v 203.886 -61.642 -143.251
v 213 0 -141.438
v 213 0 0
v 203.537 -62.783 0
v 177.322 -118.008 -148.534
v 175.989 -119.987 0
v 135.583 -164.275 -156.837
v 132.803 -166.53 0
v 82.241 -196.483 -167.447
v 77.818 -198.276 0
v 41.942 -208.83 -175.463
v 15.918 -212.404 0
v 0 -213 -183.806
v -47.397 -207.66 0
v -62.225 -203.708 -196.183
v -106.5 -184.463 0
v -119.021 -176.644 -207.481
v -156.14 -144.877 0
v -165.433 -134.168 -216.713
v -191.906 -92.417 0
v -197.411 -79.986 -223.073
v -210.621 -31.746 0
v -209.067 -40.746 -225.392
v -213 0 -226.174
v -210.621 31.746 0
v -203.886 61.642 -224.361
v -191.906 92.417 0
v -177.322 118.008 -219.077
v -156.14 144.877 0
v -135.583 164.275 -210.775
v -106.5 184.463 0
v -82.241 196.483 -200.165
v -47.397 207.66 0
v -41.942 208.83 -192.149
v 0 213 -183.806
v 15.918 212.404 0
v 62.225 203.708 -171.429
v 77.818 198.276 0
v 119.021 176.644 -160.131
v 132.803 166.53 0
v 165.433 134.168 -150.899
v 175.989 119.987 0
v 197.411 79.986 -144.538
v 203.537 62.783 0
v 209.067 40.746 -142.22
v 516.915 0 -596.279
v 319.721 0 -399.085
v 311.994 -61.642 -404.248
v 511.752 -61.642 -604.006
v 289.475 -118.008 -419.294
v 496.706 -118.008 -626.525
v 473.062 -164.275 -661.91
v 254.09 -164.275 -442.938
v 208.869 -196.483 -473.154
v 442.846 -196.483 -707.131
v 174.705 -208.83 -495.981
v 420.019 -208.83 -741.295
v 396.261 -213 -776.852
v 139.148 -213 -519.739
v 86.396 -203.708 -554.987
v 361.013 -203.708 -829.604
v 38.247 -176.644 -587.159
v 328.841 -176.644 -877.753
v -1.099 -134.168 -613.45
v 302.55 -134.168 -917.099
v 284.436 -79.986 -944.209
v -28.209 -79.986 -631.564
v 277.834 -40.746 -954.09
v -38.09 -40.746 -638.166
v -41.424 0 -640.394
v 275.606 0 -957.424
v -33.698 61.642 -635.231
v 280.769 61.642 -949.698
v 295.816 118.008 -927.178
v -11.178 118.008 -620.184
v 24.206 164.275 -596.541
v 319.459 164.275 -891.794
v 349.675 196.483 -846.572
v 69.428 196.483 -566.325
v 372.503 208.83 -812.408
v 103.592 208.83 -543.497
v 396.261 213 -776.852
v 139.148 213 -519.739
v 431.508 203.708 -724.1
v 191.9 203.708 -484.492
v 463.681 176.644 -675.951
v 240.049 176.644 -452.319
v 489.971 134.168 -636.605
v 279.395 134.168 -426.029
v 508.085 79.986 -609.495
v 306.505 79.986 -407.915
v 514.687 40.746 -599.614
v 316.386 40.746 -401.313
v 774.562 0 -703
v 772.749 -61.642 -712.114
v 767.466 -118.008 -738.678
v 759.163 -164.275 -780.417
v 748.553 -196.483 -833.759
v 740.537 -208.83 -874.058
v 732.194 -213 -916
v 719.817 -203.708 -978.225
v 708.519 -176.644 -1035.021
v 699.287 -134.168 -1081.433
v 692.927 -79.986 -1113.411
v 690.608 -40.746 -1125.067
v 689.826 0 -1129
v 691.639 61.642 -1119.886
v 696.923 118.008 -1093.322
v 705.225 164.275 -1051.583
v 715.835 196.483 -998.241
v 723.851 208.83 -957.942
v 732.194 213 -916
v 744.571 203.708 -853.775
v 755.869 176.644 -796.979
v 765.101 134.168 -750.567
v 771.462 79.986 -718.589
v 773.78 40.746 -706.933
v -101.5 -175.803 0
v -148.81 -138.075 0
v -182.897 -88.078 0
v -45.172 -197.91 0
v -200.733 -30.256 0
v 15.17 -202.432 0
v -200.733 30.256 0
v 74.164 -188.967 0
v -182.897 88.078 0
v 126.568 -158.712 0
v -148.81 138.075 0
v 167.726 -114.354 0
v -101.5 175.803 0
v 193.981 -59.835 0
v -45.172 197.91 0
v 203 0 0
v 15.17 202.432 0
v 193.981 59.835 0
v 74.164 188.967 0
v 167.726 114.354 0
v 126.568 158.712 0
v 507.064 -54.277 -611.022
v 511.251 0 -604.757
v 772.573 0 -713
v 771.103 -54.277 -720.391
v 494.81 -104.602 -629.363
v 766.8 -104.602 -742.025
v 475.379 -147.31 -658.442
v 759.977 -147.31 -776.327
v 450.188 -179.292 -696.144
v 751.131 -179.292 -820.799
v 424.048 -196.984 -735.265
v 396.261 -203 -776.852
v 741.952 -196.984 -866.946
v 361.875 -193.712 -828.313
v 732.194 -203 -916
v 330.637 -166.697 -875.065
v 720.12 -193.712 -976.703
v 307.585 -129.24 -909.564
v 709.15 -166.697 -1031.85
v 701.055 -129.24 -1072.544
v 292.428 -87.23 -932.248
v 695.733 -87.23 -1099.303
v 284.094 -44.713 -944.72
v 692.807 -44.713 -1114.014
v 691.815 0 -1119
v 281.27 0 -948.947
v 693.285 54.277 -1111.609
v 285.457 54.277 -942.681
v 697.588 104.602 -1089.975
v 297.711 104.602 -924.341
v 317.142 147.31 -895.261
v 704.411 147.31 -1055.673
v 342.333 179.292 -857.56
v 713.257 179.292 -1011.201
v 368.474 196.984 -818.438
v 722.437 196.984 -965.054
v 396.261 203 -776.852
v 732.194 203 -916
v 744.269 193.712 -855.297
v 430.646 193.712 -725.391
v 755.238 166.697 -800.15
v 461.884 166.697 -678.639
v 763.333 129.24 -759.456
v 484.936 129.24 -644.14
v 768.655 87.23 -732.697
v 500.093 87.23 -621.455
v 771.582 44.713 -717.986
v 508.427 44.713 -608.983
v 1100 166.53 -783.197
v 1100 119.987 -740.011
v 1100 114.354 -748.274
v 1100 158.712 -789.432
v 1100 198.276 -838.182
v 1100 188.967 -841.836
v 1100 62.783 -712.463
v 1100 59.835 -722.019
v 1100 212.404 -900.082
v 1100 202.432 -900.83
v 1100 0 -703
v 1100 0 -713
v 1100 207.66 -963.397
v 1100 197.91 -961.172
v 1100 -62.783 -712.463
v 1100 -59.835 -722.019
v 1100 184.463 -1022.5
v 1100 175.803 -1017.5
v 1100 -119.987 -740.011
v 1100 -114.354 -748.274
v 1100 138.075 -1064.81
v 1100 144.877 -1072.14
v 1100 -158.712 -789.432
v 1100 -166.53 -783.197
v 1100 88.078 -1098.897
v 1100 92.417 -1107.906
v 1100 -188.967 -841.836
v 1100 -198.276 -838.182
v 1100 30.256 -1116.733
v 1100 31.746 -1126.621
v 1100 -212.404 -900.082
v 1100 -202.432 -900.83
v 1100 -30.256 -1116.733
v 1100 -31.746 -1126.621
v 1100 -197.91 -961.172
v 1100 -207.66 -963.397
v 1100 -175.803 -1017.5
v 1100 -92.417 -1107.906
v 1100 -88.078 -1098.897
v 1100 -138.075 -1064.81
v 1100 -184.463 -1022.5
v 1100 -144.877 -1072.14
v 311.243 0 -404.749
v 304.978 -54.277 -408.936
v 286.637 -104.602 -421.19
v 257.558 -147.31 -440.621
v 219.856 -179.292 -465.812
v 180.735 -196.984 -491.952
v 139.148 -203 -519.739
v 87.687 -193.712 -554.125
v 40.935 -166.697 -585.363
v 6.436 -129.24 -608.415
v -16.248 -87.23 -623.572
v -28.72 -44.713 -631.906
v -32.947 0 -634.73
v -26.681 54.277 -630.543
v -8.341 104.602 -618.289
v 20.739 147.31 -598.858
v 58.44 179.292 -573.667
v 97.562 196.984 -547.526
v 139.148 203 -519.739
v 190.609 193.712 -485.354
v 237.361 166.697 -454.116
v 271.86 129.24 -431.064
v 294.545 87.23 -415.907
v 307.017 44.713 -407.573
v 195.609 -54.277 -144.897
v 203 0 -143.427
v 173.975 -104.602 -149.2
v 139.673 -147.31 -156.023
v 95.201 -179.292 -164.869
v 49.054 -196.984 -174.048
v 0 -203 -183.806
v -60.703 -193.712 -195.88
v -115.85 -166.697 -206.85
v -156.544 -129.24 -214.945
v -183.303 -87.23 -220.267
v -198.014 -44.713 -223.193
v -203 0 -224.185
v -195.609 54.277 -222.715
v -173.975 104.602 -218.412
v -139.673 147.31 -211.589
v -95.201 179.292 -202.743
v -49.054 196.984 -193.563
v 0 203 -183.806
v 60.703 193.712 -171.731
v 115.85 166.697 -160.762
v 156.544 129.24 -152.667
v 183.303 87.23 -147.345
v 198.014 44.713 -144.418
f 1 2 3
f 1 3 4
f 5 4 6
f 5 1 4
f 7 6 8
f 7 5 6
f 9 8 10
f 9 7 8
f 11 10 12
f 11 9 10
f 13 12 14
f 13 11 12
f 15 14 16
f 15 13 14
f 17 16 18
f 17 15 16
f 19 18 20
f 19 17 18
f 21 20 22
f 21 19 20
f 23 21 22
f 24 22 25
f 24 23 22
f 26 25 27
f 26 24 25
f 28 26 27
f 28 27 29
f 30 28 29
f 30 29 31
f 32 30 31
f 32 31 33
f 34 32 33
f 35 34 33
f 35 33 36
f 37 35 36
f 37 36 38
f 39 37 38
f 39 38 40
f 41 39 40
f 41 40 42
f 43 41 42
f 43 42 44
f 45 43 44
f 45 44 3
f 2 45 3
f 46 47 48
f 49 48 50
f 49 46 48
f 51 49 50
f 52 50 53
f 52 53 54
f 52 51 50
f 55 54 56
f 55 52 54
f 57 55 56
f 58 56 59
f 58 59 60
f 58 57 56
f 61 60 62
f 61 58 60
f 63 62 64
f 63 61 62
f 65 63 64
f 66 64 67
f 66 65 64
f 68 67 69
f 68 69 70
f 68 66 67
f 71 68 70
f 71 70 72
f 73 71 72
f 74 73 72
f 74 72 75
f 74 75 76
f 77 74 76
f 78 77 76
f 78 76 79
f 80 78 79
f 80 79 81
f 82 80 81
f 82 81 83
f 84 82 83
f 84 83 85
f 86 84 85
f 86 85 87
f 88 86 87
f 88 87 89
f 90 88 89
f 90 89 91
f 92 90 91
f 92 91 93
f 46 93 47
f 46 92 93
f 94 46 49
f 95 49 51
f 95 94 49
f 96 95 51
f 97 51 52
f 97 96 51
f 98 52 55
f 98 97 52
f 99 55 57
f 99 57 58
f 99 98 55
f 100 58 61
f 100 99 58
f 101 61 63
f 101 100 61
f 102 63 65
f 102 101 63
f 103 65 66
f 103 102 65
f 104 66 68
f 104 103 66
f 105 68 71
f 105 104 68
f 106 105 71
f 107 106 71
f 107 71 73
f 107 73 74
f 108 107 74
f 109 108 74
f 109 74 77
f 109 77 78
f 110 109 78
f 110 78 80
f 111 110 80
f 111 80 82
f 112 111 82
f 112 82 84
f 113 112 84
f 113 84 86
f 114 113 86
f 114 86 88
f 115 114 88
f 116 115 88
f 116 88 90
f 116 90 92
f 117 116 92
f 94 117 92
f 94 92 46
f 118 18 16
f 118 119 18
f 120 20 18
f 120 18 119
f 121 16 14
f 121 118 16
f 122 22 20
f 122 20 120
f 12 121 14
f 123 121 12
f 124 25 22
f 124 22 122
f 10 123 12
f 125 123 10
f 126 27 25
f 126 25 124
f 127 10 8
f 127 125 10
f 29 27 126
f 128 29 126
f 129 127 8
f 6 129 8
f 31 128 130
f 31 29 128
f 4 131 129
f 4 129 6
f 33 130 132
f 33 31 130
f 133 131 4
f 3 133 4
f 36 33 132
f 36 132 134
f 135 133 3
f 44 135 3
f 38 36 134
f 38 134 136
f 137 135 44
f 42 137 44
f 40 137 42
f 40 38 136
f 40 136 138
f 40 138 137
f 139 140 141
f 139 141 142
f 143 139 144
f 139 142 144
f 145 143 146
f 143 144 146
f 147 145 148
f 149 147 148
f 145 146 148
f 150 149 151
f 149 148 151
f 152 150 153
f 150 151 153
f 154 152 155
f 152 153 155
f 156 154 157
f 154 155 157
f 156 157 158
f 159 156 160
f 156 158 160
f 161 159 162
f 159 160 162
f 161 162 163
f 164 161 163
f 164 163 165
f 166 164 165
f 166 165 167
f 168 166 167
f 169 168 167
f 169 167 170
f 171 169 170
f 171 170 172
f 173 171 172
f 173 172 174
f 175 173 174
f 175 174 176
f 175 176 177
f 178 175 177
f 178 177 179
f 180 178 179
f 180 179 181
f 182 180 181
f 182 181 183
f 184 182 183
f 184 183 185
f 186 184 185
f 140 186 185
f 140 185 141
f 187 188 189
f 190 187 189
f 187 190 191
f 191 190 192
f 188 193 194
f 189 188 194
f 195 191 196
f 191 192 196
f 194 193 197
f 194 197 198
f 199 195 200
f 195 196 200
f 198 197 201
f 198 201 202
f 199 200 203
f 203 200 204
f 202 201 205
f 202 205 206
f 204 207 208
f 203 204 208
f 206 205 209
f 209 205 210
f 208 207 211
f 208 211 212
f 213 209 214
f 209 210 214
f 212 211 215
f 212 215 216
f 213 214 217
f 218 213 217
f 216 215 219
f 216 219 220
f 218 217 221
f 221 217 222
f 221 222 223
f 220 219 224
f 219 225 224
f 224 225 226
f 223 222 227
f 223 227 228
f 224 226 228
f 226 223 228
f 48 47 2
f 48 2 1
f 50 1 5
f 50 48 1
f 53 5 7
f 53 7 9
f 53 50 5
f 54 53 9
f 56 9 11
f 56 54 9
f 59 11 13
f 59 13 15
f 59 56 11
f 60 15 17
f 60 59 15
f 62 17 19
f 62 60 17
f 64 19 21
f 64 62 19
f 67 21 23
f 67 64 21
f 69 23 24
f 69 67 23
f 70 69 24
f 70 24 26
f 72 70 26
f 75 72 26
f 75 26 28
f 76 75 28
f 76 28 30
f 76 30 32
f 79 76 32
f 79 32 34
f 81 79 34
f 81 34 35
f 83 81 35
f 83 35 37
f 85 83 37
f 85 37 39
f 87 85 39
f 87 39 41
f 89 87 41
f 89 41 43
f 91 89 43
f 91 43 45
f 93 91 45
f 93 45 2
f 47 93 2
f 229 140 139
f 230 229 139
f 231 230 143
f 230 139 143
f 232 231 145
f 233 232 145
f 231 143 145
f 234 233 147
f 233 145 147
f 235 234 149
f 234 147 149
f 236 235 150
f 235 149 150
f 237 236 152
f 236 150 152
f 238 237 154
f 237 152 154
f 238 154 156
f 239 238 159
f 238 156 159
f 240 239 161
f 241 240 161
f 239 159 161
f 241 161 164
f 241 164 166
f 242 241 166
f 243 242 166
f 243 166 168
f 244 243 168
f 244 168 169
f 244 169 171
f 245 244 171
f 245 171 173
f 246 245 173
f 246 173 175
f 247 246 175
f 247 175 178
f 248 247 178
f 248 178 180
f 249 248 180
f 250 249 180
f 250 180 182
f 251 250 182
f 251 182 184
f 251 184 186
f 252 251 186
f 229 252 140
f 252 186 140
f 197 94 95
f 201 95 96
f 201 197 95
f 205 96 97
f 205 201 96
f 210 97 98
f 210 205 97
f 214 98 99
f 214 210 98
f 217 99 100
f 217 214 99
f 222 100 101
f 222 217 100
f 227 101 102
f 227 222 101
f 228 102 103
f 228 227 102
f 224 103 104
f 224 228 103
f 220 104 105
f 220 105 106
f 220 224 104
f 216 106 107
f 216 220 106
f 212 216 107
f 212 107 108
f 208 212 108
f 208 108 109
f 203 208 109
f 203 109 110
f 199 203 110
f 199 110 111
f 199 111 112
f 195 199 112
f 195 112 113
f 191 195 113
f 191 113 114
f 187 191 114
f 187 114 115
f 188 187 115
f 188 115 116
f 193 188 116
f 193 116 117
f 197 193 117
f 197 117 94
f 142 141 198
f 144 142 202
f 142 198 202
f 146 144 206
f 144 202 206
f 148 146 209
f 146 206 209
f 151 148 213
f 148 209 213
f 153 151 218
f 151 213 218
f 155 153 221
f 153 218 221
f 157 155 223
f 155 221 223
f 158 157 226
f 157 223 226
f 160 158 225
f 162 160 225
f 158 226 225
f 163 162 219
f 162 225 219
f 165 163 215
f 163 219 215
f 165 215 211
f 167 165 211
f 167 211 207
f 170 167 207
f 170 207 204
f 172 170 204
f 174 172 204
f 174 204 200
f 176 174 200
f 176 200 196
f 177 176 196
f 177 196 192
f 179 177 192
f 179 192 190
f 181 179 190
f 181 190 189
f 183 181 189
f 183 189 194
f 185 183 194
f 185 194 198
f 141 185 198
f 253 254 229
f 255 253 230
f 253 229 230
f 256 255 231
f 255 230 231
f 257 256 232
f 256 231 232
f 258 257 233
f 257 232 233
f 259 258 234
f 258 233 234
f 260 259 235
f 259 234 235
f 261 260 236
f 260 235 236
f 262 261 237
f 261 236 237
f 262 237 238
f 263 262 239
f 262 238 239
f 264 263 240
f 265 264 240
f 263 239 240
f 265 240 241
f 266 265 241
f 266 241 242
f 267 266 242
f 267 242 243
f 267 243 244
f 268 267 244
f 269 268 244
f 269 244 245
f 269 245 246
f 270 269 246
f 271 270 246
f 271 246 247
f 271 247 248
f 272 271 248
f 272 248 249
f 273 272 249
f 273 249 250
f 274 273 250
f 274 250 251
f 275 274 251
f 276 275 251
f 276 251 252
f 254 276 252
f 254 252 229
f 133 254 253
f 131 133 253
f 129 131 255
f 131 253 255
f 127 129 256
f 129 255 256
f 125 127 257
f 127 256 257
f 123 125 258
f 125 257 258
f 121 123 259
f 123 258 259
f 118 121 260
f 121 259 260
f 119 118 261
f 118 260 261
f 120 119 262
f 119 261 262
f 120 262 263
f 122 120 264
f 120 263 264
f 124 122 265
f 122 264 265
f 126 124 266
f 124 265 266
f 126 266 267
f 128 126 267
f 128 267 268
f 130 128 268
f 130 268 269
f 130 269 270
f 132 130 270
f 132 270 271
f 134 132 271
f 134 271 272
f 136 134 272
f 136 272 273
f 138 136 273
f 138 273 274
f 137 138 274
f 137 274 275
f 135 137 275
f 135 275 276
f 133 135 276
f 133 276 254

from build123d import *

# Parameters (mm, degrees)
F1_R   = 213
F1_R_2 = 203


with BuildPart() as f2:
    # F2: sweep along a path in F0
    with BuildLine(Plane.XZ) as f2_path:
        Line((0, 0), (0, -183.805903785))
        Line((0, -183.805903785), (139.1482145694, -519.7394105784))
        Line((139.1482145694, -519.7394105784), (396.2605894216, -776.8517854306))
        Line((396.2605894216, -776.8517854306), (732.194096215, -916))
        Line((732.194096215, -916), (1100, -916))
    # F1 (on Top) → F2 (sweep)
    with BuildSketch(Plane.XY):
        Circle(F1_R)
        Circle(F1_R_2, mode=Mode.SUBTRACT)
    sweep(path=f2_path.line, transition=Transition.RIGHT)


solid = f2.part
